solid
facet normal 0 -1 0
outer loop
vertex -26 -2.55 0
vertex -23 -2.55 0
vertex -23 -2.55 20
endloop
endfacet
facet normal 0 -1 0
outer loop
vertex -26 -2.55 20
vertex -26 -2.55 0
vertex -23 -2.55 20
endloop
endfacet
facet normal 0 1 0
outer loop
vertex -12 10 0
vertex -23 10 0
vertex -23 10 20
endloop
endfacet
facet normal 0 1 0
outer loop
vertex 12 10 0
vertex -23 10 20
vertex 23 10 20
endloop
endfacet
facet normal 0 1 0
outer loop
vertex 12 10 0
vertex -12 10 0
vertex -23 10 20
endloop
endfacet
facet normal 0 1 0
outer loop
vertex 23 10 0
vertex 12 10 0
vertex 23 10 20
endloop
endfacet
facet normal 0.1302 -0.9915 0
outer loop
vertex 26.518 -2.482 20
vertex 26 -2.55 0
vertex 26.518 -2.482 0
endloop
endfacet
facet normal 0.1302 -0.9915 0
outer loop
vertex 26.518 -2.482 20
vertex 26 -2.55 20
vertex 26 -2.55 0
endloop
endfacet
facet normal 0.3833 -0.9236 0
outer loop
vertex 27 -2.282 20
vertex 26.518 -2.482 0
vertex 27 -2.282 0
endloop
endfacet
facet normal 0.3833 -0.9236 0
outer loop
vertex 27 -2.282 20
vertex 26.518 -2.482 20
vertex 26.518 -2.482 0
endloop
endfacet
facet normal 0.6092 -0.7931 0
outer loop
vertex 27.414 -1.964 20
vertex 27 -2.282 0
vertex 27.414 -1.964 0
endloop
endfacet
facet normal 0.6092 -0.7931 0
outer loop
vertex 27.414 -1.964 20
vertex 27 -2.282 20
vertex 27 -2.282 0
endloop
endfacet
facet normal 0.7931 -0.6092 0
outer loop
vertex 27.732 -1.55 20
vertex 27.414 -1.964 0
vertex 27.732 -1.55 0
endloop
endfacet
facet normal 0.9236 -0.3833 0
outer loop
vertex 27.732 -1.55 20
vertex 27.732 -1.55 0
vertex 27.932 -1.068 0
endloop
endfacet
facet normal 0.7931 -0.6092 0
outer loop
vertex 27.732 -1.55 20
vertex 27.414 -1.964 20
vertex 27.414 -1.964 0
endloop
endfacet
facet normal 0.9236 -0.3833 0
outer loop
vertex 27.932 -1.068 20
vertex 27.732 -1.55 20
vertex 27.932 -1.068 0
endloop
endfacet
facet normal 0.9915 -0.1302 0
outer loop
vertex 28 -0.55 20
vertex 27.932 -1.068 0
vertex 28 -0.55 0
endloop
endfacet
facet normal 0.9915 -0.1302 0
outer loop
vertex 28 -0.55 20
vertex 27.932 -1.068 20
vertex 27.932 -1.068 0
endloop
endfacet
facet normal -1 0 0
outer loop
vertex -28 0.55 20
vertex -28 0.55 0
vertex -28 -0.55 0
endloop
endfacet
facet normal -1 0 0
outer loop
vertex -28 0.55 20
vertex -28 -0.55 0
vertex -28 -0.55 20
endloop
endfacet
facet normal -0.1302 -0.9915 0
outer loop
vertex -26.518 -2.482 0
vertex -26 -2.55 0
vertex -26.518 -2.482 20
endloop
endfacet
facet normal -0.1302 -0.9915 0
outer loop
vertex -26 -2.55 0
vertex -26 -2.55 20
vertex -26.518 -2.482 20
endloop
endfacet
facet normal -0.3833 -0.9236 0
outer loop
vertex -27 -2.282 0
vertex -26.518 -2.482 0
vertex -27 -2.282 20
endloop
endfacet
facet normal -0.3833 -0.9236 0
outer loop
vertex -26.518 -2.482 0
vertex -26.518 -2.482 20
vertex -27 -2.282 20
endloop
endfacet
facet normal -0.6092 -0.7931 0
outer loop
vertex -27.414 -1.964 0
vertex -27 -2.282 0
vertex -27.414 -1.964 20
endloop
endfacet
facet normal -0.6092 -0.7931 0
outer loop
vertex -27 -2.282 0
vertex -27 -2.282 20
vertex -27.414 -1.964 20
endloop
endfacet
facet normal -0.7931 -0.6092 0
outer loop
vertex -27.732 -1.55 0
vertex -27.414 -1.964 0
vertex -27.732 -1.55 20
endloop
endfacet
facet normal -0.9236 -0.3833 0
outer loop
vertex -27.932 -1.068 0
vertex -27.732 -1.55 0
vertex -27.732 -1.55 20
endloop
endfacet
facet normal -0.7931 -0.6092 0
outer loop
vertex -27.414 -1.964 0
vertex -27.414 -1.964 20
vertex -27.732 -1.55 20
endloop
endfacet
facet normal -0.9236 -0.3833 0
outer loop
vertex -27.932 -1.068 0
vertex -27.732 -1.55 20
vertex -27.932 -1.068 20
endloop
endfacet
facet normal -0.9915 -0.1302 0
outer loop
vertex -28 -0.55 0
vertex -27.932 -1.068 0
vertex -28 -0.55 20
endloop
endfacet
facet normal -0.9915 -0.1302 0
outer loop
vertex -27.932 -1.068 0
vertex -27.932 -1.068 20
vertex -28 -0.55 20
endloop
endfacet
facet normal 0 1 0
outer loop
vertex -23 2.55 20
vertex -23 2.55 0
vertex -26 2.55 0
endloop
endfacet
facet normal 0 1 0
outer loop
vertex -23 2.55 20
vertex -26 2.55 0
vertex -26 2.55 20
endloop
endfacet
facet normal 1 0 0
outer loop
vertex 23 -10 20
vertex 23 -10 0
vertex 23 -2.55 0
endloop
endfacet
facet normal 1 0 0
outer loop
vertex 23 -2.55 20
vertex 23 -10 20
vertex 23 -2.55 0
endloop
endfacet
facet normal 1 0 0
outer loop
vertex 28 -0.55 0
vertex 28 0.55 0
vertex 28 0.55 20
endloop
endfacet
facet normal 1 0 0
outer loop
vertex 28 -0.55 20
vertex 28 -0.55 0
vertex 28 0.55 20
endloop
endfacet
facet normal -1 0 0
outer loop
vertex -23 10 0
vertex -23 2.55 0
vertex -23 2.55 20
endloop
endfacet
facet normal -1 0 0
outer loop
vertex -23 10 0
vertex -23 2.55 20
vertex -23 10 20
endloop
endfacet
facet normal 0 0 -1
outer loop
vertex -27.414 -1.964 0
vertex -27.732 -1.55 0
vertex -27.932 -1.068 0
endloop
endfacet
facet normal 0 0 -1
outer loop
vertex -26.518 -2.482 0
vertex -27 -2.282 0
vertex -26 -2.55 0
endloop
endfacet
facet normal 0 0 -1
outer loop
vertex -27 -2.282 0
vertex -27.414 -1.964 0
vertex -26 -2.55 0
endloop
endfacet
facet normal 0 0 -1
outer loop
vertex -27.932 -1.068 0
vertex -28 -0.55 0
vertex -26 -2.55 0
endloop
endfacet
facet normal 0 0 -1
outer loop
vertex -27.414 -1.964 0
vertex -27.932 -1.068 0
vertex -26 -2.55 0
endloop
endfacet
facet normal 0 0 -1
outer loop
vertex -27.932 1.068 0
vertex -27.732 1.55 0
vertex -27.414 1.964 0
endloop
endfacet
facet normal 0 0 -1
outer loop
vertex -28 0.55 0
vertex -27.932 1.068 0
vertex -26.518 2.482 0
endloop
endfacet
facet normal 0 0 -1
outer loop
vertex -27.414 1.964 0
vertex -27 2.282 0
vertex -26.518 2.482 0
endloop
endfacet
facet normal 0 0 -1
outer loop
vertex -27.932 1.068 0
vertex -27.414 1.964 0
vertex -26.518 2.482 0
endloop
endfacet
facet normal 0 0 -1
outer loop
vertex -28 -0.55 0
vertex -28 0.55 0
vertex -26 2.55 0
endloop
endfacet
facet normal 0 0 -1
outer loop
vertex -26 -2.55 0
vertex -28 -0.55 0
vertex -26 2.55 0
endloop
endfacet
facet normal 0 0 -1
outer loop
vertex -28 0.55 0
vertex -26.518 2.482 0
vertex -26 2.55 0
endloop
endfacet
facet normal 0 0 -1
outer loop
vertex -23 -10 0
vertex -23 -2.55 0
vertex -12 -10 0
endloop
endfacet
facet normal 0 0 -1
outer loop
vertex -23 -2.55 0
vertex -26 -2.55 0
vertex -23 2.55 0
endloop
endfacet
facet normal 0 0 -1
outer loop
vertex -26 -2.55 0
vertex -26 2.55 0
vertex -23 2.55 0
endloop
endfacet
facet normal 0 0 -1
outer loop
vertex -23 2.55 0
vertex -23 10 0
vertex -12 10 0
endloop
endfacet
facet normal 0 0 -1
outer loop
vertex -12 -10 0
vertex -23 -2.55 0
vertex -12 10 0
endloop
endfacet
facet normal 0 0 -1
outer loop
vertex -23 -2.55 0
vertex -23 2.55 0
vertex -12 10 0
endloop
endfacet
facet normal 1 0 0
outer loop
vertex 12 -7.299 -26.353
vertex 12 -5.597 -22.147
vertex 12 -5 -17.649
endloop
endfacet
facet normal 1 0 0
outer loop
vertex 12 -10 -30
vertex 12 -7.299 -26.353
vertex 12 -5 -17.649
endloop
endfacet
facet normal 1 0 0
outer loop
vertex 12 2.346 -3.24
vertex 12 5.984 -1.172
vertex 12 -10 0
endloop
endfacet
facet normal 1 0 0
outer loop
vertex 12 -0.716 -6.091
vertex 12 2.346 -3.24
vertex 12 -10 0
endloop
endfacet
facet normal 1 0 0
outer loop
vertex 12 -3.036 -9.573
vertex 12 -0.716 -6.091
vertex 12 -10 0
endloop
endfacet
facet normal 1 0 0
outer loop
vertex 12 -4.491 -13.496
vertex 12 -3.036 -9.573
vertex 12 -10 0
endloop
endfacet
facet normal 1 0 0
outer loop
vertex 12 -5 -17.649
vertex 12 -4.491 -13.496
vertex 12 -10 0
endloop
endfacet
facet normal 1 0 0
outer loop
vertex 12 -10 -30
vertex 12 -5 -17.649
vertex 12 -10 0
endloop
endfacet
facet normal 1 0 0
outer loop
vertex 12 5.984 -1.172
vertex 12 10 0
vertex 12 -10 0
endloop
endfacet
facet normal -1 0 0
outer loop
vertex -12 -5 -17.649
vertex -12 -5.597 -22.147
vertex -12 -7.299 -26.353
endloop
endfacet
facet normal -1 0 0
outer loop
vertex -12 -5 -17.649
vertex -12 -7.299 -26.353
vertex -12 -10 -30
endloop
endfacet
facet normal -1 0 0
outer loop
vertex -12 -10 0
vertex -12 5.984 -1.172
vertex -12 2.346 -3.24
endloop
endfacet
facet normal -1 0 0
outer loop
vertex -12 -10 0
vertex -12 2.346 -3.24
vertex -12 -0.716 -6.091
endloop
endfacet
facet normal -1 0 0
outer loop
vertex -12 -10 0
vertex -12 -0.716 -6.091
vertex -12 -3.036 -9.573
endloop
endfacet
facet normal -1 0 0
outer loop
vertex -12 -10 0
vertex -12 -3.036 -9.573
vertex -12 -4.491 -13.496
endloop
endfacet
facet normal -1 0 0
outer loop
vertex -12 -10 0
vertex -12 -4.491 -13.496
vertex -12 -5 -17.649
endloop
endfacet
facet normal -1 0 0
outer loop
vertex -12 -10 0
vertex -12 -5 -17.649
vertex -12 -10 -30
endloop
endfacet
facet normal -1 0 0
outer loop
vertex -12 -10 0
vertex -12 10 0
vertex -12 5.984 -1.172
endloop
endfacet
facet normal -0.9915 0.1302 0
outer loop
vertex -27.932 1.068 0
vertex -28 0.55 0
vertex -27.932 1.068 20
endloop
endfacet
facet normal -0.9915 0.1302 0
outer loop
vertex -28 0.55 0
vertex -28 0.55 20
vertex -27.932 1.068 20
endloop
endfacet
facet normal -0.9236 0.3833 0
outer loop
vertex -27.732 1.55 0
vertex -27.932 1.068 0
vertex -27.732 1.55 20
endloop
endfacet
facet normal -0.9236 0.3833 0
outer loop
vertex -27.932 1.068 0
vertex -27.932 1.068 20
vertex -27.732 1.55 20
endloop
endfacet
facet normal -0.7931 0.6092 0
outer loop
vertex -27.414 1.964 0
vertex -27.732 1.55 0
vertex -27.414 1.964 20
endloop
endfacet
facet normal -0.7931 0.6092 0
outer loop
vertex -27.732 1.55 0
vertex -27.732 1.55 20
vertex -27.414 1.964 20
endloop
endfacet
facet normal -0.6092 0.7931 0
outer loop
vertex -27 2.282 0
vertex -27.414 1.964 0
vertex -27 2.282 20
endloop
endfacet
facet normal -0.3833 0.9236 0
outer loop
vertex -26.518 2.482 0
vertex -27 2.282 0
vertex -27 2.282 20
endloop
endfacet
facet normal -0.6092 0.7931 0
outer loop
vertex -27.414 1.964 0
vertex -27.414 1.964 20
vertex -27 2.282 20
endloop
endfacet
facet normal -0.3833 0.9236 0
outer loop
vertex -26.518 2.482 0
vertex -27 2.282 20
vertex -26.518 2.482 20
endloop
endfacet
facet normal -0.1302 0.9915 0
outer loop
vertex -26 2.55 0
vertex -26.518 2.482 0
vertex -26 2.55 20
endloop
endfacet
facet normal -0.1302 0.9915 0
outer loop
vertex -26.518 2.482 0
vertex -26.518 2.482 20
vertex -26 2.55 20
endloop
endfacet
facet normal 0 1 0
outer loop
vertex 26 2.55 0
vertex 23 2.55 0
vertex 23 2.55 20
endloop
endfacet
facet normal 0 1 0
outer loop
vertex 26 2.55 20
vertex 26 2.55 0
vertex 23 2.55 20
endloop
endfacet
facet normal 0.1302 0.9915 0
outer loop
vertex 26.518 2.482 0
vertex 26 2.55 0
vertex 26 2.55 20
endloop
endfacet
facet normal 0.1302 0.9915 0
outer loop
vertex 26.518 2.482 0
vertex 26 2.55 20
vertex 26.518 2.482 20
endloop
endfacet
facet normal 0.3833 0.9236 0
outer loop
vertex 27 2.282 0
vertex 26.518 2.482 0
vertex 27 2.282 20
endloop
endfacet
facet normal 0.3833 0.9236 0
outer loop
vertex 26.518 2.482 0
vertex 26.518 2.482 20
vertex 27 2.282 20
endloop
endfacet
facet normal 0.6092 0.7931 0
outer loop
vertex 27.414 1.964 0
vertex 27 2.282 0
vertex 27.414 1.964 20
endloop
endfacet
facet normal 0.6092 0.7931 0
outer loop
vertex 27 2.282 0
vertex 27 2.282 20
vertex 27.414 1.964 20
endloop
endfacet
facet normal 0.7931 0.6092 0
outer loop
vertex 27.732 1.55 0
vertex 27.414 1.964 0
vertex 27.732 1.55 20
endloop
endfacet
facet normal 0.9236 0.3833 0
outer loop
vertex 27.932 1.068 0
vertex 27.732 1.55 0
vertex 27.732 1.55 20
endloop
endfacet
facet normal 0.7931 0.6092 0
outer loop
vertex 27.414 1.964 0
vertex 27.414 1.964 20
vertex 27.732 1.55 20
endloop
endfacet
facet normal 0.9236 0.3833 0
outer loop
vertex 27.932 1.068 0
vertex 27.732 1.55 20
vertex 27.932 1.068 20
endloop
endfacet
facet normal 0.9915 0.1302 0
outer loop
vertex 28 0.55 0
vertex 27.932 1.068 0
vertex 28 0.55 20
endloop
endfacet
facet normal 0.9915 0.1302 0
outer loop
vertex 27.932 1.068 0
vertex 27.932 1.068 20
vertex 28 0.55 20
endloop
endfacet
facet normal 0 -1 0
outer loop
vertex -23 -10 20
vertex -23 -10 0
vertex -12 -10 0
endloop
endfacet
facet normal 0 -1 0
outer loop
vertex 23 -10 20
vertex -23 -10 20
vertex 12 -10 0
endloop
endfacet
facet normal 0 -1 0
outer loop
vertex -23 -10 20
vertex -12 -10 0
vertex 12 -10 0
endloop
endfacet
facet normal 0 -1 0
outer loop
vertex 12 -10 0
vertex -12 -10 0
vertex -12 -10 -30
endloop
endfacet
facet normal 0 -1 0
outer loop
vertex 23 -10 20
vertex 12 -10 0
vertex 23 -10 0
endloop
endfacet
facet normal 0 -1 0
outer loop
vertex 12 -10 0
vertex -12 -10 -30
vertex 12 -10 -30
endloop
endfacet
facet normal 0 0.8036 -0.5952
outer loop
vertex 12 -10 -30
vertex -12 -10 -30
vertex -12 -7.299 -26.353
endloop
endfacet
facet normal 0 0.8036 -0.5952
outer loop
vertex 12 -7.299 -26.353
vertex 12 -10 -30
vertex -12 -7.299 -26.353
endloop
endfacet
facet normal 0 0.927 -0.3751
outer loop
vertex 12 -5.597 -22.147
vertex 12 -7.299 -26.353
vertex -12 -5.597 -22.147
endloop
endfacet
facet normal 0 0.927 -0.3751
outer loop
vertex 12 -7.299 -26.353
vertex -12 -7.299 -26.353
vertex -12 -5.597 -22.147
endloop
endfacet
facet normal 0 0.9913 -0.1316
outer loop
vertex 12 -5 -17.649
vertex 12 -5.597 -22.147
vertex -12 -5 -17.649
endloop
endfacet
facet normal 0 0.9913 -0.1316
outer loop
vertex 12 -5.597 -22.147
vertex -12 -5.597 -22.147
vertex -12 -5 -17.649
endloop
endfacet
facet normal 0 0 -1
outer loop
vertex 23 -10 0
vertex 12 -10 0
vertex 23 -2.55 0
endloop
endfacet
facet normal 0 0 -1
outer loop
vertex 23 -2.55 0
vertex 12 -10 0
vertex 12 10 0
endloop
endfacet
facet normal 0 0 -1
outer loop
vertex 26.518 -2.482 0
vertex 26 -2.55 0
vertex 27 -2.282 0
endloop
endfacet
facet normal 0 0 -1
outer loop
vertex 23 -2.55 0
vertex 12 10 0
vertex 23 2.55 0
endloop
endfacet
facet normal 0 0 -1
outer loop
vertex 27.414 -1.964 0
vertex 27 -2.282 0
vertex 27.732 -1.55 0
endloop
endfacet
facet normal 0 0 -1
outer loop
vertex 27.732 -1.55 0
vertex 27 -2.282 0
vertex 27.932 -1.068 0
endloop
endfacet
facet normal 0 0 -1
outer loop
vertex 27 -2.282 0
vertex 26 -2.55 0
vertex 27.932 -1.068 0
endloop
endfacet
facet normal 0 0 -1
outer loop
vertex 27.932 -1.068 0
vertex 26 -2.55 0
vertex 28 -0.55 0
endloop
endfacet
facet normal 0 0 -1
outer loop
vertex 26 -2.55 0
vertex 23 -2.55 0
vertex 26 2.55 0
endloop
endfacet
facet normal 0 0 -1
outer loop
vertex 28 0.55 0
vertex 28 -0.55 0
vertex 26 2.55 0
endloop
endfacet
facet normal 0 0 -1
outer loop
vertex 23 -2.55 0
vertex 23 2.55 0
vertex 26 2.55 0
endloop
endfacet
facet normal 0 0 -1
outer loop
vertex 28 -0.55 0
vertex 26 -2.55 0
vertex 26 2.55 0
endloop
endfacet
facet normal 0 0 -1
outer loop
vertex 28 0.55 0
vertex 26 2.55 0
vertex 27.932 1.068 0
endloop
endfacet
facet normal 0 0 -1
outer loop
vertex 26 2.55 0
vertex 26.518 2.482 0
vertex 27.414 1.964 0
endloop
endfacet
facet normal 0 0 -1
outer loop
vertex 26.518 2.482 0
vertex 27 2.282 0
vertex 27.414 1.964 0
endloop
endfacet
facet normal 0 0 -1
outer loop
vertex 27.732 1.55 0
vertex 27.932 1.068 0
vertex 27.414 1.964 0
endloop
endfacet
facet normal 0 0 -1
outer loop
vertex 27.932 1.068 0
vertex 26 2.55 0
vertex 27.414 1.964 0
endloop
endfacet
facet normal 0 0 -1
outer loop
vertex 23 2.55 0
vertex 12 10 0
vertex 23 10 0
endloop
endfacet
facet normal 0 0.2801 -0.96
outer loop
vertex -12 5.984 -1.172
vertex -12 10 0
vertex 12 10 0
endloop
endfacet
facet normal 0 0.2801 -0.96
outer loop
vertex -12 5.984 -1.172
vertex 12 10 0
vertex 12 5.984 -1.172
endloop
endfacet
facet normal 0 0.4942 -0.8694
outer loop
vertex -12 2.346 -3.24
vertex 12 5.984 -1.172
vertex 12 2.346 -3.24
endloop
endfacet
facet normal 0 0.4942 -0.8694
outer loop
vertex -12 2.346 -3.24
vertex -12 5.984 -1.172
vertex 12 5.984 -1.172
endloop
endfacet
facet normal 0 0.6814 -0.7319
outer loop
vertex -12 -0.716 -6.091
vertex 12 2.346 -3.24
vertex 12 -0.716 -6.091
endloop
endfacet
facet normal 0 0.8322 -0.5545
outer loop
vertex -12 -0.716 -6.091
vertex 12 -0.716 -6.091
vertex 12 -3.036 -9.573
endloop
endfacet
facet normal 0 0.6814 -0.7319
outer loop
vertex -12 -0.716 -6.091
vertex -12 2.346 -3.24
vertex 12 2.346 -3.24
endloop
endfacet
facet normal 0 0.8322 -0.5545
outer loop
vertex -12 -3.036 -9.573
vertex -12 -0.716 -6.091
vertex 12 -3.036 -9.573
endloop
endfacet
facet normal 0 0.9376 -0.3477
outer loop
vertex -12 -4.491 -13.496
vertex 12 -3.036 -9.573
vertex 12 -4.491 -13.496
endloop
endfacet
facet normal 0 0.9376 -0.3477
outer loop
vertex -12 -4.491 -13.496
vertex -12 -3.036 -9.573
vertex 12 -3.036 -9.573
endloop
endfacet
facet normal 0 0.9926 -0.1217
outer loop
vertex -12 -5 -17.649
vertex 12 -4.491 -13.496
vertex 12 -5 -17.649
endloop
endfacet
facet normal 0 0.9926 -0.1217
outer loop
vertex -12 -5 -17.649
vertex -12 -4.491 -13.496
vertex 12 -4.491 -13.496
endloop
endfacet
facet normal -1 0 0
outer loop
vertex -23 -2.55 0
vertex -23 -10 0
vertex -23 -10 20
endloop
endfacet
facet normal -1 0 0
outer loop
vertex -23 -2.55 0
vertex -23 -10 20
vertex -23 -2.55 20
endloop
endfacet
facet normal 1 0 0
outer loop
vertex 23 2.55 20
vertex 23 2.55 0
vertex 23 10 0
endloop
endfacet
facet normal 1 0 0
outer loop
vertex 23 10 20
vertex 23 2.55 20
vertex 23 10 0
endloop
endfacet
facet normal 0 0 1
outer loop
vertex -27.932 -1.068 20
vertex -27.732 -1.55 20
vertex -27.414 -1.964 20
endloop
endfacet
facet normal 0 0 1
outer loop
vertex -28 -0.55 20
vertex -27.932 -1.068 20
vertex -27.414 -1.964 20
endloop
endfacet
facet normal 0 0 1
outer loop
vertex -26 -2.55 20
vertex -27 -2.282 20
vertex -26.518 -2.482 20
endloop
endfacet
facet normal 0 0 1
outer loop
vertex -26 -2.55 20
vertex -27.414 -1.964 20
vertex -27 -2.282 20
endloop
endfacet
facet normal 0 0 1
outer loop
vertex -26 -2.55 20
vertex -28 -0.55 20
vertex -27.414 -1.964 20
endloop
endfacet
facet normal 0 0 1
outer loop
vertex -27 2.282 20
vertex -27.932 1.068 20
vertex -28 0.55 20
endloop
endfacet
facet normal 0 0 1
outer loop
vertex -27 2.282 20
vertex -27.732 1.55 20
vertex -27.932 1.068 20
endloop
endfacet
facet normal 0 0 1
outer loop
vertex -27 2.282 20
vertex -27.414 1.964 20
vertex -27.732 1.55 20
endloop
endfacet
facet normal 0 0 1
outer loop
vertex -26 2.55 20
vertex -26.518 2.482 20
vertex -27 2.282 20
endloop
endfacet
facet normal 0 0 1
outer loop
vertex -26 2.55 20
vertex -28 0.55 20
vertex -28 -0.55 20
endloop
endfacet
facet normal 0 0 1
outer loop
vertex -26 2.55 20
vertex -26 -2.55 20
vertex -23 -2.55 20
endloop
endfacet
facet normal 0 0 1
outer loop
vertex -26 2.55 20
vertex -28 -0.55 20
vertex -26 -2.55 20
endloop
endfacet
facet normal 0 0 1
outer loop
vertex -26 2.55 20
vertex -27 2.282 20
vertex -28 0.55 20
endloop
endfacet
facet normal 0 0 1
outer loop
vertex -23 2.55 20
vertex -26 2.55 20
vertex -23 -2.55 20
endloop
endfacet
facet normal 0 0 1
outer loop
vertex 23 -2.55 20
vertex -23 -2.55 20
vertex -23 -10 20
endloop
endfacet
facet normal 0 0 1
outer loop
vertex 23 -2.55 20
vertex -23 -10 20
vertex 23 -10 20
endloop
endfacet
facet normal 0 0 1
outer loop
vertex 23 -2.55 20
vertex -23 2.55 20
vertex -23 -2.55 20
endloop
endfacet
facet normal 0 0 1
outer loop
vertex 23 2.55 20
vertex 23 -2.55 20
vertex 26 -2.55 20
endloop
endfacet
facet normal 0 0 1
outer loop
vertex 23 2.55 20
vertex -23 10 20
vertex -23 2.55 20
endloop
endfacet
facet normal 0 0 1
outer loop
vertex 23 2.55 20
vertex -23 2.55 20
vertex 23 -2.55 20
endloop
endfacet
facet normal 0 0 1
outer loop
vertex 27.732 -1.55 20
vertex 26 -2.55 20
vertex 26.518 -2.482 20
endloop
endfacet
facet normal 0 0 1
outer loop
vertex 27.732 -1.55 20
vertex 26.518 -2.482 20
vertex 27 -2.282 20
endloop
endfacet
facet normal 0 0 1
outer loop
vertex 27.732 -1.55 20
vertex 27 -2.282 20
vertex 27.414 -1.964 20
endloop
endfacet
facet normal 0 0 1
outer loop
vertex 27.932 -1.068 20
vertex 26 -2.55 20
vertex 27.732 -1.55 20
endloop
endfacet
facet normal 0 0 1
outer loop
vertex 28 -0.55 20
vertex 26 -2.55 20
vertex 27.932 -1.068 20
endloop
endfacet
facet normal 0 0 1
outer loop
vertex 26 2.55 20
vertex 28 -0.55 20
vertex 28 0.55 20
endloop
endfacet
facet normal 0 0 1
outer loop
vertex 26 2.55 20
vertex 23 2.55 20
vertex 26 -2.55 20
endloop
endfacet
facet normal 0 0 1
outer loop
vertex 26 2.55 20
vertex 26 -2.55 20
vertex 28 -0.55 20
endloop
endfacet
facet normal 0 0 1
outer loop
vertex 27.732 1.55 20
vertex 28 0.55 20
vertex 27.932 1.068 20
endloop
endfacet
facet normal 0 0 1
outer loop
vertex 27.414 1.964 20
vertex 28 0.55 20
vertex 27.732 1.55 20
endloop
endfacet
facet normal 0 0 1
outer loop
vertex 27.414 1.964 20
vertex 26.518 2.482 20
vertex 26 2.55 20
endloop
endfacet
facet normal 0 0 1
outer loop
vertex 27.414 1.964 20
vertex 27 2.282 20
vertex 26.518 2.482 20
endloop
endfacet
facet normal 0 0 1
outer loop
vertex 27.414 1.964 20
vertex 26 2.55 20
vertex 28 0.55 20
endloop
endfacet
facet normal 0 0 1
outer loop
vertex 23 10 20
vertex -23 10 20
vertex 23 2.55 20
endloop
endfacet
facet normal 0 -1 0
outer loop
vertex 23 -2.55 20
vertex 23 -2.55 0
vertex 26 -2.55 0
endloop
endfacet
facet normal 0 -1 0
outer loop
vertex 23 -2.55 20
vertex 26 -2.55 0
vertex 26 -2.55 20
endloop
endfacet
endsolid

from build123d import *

# Parameters (mm, degrees)
SKETCH_1_W             = 46
SKETCH_1_H             = 20
EXTRUDE_1_DEPTH        = 20
SKETCH_2_W             = 20
SKETCH_2_H             = 5.1
EXTRUDE_2_DEPTH        = 5
FILLET_1_R             = 2
FILLET_1_OF_MIRROR_1_R = 2
SKETCH_3_W             = 24
SKETCH_3_H             = 5
EXTRUDE_3_DEPTH        = 30
FILLET_2_R             = 18
FILLET_3_R             = 18


with BuildPart() as part:
    # 스케치1 → 보스-돌출1 (new body)
    with BuildSketch(Plane.XY):
        Rectangle(SKETCH_1_W, SKETCH_1_H)
    extrude(amount=EXTRUDE_1_DEPTH)

    # 스케치2 → 보스-돌출2 (add)
    with BuildSketch(Plane.ZY.offset(23)):
        with Locations((10, 0)):
            Rectangle(SKETCH_2_W, SKETCH_2_H)
    extrude_2 = extrude(amount=EXTRUDE_2_DEPTH)

    # 필렛1
    fillet_1_edges = [part.edges().sort_by_distance(p)[0] for p in [
        (-28, 2.55, 10),
        (-28, -2.55, 10),
    ]]
    fillet(fillet_1_edges, radius=FILLET_1_R)

    # 대칭 복사1: 보스-돌출2 across plane
    add(extrude_2.mirror(Plane(origin=(0, 0, 0), x_dir=(0, 0, 1), z_dir=(1, 0, 0))))

    # 필렛1 of 대칭 복사1
    fillet_1_of_mirror_1_edges = [part.edges().sort_by_distance(p)[0] for p in [
        (28, 2.55, 10),
        (28, -2.55, 10),
    ]]
    fillet(fillet_1_of_mirror_1_edges, radius=FILLET_1_OF_MIRROR_1_R)

    # 스케치3 → 보스-돌출3 (add)
    with BuildSketch(Plane(origin=(0, 0, 0), x_dir=(-1, 0, 0), z_dir=(0, 0, -1))):
        with Locations((0, -7.5)):
            Rectangle(SKETCH_3_W, SKETCH_3_H)
    extrude(amount=EXTRUDE_3_DEPTH)

    # 필렛2
    # the kernel refuses this fillet: 18 mm, written as the material it adds along each edge
    with BuildSketch(Plane(origin=(-12, -5, 0), x_dir=(0, 1, 0), z_dir=(1, 0, 0))) as fillet_2_piece_1:
        with BuildLine():
            CenterArc((18, -17.748239349), FILLET_2_R, 99.594068227, 80.405931773)
            Line((0, -17.748239349), (0, 0))
            Line((0, 0), (15, 0))
        make_face()
    extrude(amount=24)

    # 필렛3
    # the kernel refuses this fillet: 18 mm, written as the material it takes off along each edge
    with BuildSketch(Plane(origin=(-42.877791108, -5, -30), x_dir=(0, -1, 0), z_dir=(1, 0, 0))) as fillet_3_piece_1:
        with BuildLine():
            CenterArc((17.999451575, -12.45047223), FILLET_3_R, 136.235733455, 43.448005638)
            Line((-0.000274212, -12.35111644), (-1.800246791, -12.341180861))
            ThreePointArc((-1.800246791, -12.341180861), (-1.8, -12.251760651), (-1.8, 0))
            Line((-1.8, 0), (0, 1.8))
            ThreePointArc((0, 1.8), (2.5, 1.8), (3.700054842, 1.245047223))
            Line((3.700054842, 1.245047223), (5, 0))
        make_face()
    extrude(amount=85.755582217, mode=Mode.SUBTRACT)


solid = part.part
